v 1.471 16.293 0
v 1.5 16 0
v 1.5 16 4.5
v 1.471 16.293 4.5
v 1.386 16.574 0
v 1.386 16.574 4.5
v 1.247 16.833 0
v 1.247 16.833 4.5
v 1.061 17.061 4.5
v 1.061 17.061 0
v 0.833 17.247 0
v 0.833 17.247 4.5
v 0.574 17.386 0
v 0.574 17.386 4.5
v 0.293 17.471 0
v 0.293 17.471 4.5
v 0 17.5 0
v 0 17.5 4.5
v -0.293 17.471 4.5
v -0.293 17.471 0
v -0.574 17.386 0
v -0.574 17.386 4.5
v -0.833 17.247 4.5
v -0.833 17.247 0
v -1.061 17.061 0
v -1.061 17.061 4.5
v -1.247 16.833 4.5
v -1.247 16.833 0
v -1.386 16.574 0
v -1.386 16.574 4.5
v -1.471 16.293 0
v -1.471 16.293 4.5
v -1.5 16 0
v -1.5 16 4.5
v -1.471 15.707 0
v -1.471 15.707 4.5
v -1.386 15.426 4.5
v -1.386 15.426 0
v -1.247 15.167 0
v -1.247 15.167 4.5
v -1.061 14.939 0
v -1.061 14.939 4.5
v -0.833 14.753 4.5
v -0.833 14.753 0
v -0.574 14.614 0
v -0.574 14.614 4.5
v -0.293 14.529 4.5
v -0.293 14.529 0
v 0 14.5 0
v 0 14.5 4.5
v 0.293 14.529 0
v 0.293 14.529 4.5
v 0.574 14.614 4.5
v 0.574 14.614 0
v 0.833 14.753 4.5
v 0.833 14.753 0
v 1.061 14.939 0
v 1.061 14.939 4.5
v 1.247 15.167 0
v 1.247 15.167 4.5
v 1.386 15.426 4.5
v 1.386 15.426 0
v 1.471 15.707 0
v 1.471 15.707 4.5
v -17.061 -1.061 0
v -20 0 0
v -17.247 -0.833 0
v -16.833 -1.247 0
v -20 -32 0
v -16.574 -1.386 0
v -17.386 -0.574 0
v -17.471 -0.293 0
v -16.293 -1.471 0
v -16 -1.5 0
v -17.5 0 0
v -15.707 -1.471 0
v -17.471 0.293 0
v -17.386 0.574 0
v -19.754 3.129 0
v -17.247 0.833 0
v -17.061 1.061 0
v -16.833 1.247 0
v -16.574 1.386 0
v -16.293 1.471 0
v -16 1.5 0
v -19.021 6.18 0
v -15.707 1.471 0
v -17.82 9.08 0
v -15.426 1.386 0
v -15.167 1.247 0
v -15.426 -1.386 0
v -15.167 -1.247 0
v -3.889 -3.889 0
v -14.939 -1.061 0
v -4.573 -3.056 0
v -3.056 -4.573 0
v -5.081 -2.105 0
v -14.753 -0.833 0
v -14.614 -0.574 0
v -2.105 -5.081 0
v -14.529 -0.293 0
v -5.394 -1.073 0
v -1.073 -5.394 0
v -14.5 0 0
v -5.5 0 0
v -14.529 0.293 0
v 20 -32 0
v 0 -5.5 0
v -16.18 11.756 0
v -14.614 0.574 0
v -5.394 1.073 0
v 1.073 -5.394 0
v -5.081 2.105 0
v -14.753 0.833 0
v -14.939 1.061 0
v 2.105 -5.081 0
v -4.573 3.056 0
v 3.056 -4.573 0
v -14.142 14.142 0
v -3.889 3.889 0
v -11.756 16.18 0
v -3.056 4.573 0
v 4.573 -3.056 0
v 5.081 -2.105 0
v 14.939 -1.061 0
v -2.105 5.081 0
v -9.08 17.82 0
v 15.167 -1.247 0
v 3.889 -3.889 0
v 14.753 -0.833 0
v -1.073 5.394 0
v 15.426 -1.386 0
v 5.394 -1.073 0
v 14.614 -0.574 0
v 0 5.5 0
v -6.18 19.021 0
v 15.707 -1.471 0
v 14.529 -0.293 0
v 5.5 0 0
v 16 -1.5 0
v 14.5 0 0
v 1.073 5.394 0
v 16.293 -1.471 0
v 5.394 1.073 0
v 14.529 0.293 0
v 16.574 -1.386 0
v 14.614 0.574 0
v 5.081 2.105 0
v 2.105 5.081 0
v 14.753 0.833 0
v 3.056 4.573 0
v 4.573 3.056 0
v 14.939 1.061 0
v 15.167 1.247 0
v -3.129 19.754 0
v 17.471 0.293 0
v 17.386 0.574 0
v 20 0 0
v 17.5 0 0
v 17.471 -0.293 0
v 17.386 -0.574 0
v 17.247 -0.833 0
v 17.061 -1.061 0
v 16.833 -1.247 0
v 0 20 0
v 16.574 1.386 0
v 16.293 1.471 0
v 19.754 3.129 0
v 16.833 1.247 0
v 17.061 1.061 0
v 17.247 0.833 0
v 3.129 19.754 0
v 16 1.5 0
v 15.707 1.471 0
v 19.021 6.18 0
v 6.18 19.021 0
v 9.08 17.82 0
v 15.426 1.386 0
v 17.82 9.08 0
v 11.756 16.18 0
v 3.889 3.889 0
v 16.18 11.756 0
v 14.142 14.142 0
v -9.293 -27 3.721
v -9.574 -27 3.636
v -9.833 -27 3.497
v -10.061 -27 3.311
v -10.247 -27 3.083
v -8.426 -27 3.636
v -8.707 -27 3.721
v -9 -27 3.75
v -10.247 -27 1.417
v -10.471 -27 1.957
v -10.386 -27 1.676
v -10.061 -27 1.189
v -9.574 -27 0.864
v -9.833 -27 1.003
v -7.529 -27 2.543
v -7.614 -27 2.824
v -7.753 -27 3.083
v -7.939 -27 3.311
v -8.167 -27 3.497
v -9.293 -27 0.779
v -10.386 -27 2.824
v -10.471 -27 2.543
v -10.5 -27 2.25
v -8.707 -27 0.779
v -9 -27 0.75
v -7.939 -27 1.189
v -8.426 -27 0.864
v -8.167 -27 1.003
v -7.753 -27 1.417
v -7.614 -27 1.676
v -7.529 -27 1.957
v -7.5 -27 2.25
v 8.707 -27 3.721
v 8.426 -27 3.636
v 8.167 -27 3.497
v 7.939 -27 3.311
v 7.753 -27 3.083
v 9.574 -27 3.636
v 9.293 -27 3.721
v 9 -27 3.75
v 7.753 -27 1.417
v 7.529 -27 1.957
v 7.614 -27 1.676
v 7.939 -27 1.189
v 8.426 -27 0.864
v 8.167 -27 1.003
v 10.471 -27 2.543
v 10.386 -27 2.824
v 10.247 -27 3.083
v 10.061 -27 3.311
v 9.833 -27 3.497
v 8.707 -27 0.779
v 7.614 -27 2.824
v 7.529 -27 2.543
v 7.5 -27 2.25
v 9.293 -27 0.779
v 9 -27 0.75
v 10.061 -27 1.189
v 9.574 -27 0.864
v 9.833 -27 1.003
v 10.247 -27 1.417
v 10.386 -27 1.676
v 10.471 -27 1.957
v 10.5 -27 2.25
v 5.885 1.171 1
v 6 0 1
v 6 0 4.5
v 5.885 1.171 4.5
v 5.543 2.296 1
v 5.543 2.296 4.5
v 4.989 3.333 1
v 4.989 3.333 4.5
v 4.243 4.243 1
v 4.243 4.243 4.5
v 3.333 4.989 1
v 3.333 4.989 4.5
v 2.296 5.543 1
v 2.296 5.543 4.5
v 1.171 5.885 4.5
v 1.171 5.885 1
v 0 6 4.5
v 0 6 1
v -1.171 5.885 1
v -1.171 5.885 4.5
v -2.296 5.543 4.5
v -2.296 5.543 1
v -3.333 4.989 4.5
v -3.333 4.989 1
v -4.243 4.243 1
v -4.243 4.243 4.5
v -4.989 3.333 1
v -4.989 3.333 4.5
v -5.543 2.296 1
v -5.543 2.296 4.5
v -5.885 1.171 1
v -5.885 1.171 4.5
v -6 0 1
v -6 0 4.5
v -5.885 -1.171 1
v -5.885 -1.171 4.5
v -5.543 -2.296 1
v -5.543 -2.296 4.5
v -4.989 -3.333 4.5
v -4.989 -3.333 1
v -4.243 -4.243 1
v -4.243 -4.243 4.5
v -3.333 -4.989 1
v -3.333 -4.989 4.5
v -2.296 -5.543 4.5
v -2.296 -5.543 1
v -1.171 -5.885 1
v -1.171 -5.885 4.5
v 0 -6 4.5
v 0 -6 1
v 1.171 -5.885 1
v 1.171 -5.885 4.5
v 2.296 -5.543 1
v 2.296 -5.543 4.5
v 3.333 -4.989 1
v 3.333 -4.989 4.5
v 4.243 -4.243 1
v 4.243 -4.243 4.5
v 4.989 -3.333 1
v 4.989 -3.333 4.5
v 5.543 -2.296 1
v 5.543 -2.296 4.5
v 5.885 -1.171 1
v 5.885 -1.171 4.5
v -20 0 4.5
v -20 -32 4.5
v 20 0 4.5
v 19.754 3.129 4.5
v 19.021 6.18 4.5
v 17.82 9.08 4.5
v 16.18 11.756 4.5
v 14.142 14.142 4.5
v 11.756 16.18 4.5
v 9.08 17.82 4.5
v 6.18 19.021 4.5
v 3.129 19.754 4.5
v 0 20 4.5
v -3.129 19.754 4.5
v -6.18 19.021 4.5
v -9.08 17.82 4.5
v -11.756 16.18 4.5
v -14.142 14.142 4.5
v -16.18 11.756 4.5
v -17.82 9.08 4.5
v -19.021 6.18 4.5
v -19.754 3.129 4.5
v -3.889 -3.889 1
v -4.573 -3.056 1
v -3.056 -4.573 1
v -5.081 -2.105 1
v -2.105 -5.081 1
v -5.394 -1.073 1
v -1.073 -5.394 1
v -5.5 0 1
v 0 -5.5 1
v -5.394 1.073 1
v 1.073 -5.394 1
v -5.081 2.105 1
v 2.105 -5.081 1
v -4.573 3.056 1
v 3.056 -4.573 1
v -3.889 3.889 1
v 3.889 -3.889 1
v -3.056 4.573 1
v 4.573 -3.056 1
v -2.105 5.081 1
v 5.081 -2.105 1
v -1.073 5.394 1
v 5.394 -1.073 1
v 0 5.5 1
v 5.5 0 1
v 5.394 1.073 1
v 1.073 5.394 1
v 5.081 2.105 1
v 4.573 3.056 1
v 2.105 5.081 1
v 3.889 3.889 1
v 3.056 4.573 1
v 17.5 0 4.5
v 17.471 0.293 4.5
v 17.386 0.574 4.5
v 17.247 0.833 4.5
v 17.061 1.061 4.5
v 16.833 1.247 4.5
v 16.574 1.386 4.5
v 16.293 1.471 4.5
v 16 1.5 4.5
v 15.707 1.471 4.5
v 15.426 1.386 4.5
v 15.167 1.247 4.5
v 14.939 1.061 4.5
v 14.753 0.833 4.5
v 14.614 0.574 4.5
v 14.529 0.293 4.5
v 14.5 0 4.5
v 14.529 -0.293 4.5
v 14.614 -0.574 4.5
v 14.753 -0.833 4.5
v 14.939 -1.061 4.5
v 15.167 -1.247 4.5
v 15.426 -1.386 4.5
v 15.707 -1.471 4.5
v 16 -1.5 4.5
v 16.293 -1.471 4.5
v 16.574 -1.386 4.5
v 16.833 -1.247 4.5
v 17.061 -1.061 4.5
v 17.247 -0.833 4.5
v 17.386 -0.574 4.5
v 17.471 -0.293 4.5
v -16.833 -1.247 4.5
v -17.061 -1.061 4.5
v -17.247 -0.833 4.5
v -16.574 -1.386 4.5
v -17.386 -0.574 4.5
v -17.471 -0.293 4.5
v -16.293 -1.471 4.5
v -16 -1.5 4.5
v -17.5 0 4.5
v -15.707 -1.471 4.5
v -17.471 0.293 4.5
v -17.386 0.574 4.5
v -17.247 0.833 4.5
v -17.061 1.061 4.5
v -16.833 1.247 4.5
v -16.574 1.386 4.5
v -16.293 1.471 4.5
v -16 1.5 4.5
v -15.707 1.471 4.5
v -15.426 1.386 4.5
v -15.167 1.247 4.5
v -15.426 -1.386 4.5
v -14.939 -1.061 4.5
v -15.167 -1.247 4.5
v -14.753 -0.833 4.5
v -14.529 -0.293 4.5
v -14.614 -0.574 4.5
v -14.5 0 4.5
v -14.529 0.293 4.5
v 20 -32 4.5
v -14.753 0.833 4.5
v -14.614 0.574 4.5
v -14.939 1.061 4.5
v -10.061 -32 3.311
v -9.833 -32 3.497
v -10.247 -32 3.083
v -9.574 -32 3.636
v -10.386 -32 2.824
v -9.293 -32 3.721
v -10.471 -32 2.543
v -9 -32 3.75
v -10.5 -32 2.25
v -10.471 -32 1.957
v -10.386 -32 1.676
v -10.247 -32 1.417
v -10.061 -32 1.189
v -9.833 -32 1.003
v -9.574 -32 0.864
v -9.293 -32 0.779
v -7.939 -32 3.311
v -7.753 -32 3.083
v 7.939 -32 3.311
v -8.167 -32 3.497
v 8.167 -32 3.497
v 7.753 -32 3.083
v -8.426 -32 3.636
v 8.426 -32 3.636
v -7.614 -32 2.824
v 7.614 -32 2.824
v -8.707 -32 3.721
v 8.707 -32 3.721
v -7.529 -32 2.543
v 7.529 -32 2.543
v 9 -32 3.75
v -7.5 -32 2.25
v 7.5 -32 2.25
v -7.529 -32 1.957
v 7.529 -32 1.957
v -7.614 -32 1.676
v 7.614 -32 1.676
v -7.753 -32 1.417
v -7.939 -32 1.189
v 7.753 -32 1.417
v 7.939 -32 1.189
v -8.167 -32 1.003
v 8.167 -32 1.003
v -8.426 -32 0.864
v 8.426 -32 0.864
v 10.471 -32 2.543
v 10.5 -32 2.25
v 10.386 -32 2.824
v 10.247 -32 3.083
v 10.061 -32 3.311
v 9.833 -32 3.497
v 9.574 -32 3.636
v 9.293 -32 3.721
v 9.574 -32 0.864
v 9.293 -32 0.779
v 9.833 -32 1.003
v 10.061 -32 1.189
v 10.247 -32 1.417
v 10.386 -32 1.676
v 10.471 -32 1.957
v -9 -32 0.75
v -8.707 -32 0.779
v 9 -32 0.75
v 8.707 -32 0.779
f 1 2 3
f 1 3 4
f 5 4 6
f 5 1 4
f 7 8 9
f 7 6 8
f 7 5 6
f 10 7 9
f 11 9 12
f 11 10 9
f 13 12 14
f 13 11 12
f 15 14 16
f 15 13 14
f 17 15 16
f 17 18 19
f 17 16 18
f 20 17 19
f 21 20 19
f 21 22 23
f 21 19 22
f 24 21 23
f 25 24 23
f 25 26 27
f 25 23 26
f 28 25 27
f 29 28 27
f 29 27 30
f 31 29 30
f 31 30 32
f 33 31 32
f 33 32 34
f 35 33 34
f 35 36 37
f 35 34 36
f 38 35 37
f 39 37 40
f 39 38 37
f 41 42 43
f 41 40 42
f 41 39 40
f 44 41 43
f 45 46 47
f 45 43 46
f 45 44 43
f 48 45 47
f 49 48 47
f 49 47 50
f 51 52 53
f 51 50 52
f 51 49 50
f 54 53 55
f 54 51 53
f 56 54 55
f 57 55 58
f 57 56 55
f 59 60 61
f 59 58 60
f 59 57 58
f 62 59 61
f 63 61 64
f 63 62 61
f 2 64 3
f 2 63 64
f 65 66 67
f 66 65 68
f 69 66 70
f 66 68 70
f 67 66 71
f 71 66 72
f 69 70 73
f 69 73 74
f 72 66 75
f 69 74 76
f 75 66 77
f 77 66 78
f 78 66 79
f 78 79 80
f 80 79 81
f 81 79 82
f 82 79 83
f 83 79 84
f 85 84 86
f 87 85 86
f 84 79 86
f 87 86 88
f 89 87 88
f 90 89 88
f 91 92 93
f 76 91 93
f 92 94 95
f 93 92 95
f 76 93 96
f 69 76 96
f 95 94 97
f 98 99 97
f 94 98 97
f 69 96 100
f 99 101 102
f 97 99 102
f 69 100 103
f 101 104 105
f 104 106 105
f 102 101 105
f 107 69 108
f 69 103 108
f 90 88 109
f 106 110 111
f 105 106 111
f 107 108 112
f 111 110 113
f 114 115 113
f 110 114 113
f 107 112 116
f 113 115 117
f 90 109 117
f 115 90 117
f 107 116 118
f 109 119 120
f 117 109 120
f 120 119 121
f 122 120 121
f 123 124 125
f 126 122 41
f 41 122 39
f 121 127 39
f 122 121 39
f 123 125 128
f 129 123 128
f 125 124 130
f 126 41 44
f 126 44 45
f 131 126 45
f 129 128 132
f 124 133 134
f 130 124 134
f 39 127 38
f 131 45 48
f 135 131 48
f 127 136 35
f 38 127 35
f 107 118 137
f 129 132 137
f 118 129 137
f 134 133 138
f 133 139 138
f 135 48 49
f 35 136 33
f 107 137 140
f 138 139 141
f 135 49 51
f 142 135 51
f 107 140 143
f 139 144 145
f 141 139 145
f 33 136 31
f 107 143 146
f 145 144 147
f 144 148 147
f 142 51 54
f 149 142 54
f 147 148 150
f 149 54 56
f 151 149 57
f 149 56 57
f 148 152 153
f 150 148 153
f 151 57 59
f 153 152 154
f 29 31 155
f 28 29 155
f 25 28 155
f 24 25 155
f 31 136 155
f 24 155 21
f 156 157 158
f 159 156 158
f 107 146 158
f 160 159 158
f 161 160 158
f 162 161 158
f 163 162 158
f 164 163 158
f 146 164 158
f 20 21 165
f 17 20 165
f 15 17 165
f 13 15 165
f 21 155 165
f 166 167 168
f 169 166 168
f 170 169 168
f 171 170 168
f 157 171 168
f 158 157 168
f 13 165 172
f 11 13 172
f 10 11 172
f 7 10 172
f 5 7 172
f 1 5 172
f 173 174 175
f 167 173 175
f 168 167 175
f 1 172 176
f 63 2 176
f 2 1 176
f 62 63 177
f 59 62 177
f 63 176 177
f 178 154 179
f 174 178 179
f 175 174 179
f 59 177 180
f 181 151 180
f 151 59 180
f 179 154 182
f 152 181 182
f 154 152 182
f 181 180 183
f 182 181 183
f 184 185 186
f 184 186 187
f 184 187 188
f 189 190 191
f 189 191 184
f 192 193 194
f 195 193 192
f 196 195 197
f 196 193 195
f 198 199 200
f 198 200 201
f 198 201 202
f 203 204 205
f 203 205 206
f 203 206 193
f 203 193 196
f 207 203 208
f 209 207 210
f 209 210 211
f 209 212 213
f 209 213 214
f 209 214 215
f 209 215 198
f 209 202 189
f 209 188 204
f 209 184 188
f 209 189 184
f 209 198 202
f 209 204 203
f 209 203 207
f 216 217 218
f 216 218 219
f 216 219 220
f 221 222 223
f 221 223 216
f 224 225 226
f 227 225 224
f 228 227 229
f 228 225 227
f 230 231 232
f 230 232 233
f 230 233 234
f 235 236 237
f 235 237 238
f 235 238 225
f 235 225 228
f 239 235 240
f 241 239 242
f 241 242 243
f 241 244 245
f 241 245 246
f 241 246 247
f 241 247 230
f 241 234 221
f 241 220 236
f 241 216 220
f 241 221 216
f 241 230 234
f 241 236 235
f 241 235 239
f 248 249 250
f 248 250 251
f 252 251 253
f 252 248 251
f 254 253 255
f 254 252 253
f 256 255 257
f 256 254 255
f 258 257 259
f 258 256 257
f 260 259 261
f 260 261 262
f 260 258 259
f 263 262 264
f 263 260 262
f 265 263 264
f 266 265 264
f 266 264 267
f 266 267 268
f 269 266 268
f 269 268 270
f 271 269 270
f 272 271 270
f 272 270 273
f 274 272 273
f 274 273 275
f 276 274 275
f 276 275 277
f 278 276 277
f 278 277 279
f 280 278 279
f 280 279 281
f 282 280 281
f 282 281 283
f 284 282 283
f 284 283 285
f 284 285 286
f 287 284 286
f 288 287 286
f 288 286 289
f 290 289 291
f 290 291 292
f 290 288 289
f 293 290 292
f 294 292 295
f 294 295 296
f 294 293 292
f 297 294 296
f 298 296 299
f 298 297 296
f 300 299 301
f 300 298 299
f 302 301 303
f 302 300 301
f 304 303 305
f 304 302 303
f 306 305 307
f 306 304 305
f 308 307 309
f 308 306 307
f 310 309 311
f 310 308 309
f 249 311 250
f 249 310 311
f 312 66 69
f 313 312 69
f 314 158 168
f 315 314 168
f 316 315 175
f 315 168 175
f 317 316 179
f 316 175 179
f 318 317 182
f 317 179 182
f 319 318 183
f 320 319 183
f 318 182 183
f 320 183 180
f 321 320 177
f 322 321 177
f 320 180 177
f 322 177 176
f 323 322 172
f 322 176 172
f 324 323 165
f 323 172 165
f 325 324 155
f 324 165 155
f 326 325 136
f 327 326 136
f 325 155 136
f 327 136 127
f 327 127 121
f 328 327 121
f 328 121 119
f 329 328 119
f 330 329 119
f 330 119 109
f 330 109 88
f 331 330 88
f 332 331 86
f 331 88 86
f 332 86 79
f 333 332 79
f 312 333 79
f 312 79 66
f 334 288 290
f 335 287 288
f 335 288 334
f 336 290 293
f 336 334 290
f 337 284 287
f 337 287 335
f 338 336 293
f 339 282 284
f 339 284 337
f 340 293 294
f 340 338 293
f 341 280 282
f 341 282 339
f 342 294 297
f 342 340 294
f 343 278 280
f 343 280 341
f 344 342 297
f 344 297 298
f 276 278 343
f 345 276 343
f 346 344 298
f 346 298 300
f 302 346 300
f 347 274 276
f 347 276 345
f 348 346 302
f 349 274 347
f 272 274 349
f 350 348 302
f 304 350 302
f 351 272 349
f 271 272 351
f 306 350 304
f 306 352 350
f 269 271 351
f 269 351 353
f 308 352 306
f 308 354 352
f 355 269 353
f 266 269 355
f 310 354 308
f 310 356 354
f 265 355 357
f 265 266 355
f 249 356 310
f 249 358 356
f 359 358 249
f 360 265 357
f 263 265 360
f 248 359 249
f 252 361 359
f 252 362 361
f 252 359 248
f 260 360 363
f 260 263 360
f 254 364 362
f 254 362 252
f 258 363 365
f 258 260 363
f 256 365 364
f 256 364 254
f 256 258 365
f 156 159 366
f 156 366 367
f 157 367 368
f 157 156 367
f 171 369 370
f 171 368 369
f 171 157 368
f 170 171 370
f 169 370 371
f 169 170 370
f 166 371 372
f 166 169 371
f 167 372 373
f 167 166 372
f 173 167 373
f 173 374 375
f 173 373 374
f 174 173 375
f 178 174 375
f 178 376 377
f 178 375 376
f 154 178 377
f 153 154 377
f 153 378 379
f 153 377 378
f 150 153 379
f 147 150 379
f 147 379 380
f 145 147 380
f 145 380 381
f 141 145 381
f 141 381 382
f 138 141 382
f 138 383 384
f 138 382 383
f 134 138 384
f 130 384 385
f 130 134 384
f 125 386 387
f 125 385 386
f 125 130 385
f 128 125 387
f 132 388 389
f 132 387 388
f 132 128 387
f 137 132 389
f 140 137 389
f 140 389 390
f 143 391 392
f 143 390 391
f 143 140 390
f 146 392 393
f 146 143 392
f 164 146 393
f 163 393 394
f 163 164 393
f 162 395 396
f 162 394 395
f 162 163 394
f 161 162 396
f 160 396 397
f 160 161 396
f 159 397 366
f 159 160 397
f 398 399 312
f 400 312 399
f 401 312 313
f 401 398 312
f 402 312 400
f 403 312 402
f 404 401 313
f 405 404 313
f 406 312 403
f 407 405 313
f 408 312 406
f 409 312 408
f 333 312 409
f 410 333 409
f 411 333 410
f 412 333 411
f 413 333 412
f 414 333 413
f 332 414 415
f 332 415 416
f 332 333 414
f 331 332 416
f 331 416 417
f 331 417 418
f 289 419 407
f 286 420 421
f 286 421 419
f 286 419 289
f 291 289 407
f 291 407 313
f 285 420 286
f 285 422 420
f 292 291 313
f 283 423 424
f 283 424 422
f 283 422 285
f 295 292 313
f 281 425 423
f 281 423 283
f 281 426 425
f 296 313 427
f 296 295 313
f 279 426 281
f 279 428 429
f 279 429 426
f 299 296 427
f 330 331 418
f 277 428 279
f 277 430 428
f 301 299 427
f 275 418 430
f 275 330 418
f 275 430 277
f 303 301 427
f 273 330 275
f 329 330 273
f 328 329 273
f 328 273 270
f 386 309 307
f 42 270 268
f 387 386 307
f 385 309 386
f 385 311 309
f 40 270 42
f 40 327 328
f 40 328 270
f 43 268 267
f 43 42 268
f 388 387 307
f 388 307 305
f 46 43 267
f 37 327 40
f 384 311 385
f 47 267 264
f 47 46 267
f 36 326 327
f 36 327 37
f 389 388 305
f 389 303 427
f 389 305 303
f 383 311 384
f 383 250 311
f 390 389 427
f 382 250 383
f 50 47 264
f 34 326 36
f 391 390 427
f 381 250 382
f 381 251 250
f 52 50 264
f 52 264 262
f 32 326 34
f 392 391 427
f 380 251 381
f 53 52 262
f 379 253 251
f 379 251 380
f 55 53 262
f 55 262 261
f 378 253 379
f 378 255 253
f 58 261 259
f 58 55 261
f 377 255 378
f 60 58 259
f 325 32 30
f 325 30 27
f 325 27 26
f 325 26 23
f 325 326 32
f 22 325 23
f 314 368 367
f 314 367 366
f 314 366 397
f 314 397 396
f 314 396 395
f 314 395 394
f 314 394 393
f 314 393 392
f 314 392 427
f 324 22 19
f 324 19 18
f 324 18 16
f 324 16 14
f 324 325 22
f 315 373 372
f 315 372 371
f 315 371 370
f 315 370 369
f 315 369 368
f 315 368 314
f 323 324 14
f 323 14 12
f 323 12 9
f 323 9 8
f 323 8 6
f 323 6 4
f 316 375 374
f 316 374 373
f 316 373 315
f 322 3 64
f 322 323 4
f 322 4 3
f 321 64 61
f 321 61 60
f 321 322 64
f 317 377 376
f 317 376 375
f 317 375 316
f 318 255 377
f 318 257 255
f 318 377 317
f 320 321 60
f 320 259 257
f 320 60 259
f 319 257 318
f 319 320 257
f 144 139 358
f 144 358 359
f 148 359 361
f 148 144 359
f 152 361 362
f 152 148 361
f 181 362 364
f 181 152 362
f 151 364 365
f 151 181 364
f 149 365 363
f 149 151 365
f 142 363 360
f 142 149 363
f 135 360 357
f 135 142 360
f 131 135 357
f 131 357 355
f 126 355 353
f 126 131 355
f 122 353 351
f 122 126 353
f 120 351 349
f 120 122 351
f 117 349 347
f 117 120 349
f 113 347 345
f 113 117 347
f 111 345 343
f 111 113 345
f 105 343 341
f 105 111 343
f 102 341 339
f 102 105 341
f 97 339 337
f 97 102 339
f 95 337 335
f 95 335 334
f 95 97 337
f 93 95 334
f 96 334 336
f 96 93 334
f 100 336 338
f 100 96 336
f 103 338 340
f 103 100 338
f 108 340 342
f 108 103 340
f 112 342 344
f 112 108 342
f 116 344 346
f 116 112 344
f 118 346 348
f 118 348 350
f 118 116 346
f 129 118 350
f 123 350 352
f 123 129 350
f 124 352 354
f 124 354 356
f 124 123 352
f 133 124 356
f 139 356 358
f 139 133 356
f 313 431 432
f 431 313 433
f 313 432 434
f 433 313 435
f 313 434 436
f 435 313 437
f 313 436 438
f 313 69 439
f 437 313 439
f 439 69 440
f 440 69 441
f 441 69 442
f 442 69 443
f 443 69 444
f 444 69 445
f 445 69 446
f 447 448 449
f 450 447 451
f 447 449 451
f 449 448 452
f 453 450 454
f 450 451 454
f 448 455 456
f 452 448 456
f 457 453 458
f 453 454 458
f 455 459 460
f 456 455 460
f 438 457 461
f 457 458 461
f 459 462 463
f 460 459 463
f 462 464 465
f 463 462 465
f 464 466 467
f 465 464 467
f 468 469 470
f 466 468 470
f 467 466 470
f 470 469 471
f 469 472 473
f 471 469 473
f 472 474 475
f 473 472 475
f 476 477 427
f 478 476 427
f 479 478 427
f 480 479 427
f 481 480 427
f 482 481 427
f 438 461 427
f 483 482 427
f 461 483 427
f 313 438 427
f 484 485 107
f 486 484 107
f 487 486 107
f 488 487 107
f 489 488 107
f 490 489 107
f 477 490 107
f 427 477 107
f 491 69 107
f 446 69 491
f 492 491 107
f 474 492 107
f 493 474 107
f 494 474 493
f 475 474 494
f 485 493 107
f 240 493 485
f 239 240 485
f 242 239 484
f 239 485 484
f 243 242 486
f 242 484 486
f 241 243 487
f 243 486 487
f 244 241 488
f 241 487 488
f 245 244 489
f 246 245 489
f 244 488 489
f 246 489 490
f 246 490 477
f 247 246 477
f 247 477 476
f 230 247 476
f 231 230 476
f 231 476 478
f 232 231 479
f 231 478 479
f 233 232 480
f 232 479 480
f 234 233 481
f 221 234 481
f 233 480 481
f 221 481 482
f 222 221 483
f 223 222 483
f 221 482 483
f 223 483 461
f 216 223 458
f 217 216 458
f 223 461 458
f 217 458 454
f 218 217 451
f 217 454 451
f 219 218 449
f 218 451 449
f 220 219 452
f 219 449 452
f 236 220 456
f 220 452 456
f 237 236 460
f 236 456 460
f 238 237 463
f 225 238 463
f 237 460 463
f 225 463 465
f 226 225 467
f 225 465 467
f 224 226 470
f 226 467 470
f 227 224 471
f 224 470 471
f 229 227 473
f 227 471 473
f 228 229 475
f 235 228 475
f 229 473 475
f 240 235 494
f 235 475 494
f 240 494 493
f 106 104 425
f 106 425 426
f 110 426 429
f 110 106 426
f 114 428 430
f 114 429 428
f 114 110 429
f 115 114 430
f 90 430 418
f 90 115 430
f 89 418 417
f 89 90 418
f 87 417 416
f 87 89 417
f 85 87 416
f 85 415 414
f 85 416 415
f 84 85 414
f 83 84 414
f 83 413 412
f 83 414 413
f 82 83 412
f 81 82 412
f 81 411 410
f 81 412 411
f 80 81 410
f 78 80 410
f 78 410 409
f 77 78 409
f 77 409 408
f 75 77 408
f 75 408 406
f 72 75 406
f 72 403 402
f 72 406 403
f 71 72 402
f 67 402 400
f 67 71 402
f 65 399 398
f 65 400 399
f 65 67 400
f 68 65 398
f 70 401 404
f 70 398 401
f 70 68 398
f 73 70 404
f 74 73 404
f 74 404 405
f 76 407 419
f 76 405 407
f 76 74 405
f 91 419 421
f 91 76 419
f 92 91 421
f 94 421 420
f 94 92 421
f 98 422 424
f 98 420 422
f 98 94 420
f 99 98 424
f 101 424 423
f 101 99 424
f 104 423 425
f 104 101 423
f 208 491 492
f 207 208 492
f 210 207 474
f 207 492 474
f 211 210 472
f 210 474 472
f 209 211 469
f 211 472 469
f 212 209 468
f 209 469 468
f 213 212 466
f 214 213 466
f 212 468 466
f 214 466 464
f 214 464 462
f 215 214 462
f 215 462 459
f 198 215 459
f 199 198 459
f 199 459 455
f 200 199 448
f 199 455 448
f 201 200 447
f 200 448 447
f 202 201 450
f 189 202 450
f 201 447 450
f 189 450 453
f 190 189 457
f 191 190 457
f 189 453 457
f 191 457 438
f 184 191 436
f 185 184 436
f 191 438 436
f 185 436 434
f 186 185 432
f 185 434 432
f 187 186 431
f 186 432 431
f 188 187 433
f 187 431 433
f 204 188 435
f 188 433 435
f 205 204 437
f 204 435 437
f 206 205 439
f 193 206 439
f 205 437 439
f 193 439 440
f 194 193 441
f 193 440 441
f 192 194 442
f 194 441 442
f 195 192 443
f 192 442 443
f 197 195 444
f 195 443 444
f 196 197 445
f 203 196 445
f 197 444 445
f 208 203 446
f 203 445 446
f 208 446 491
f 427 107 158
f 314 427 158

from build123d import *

# Parameters (mm, degrees)
SKETCH_1_R               = 6
EXTRUDE_1_DEPTH          = 4.5
SKETCH_3_R               = 6
SKETCH_3_R_2             = 5.5
EXTRUDE_2_DEPTH          = 1
CUT_EXTRUDE_3_DEPTH      = 39.003289331
CUT_EXTRUDE_3_DEPTH_BACK = 39.003289331
SKETCH_5_R               = 1.5
SKETCH_6_R               = 1.5
CUT_EXTRUDE_4_DEPTH      = 5


with BuildPart() as part:
    # 草图1 → 凸台-拉伸1 (new body)
    with BuildSketch(Plane.XY):
        with BuildLine():
            Line((-20, 0), (-20, -32))
            Line((-20, -32), (20, -32))
            Line((20, -32), (20, 0))
            ThreePointArc((20, 0), (0, 20), (-20, 0))
        make_face()
        Circle(SKETCH_1_R, mode=Mode.SUBTRACT)
    extrude(amount=EXTRUDE_1_DEPTH)

    # 草图3 → 凸台-拉伸2 (add)
    with BuildSketch(Plane.XY):
        Circle(SKETCH_3_R)
        Circle(SKETCH_3_R_2, mode=Mode.SUBTRACT)
    extrude(amount=EXTRUDE_2_DEPTH)

    # 草图5 → 切除-拉伸3 (cut, two sides: drawn at the far end of the back side and taken through both)
    with BuildSketch(Plane.XY.offset(-CUT_EXTRUDE_3_DEPTH_BACK)):
        with Locations((0, 16)):
            Circle(SKETCH_5_R)
        with Locations((-16, 0)):
            Circle(SKETCH_5_R)
        with Locations((16, 0)):
            Circle(SKETCH_5_R)
    extrude(amount=CUT_EXTRUDE_3_DEPTH + CUT_EXTRUDE_3_DEPTH_BACK, mode=Mode.SUBTRACT)

    # 草图6 → 切除-拉伸4 (cut)
    with BuildSketch(Plane.XZ.offset(32)):
        with Locations(Location((9, 2.25, 0), (0, 0, 270))):
            Circle(SKETCH_6_R)
        with Locations(Location((-9, 2.25, 0), (0, 0, 270))):
            Circle(SKETCH_6_R)
    extrude(amount=-CUT_EXTRUDE_4_DEPTH, mode=Mode.SUBTRACT)


solid = part.part
